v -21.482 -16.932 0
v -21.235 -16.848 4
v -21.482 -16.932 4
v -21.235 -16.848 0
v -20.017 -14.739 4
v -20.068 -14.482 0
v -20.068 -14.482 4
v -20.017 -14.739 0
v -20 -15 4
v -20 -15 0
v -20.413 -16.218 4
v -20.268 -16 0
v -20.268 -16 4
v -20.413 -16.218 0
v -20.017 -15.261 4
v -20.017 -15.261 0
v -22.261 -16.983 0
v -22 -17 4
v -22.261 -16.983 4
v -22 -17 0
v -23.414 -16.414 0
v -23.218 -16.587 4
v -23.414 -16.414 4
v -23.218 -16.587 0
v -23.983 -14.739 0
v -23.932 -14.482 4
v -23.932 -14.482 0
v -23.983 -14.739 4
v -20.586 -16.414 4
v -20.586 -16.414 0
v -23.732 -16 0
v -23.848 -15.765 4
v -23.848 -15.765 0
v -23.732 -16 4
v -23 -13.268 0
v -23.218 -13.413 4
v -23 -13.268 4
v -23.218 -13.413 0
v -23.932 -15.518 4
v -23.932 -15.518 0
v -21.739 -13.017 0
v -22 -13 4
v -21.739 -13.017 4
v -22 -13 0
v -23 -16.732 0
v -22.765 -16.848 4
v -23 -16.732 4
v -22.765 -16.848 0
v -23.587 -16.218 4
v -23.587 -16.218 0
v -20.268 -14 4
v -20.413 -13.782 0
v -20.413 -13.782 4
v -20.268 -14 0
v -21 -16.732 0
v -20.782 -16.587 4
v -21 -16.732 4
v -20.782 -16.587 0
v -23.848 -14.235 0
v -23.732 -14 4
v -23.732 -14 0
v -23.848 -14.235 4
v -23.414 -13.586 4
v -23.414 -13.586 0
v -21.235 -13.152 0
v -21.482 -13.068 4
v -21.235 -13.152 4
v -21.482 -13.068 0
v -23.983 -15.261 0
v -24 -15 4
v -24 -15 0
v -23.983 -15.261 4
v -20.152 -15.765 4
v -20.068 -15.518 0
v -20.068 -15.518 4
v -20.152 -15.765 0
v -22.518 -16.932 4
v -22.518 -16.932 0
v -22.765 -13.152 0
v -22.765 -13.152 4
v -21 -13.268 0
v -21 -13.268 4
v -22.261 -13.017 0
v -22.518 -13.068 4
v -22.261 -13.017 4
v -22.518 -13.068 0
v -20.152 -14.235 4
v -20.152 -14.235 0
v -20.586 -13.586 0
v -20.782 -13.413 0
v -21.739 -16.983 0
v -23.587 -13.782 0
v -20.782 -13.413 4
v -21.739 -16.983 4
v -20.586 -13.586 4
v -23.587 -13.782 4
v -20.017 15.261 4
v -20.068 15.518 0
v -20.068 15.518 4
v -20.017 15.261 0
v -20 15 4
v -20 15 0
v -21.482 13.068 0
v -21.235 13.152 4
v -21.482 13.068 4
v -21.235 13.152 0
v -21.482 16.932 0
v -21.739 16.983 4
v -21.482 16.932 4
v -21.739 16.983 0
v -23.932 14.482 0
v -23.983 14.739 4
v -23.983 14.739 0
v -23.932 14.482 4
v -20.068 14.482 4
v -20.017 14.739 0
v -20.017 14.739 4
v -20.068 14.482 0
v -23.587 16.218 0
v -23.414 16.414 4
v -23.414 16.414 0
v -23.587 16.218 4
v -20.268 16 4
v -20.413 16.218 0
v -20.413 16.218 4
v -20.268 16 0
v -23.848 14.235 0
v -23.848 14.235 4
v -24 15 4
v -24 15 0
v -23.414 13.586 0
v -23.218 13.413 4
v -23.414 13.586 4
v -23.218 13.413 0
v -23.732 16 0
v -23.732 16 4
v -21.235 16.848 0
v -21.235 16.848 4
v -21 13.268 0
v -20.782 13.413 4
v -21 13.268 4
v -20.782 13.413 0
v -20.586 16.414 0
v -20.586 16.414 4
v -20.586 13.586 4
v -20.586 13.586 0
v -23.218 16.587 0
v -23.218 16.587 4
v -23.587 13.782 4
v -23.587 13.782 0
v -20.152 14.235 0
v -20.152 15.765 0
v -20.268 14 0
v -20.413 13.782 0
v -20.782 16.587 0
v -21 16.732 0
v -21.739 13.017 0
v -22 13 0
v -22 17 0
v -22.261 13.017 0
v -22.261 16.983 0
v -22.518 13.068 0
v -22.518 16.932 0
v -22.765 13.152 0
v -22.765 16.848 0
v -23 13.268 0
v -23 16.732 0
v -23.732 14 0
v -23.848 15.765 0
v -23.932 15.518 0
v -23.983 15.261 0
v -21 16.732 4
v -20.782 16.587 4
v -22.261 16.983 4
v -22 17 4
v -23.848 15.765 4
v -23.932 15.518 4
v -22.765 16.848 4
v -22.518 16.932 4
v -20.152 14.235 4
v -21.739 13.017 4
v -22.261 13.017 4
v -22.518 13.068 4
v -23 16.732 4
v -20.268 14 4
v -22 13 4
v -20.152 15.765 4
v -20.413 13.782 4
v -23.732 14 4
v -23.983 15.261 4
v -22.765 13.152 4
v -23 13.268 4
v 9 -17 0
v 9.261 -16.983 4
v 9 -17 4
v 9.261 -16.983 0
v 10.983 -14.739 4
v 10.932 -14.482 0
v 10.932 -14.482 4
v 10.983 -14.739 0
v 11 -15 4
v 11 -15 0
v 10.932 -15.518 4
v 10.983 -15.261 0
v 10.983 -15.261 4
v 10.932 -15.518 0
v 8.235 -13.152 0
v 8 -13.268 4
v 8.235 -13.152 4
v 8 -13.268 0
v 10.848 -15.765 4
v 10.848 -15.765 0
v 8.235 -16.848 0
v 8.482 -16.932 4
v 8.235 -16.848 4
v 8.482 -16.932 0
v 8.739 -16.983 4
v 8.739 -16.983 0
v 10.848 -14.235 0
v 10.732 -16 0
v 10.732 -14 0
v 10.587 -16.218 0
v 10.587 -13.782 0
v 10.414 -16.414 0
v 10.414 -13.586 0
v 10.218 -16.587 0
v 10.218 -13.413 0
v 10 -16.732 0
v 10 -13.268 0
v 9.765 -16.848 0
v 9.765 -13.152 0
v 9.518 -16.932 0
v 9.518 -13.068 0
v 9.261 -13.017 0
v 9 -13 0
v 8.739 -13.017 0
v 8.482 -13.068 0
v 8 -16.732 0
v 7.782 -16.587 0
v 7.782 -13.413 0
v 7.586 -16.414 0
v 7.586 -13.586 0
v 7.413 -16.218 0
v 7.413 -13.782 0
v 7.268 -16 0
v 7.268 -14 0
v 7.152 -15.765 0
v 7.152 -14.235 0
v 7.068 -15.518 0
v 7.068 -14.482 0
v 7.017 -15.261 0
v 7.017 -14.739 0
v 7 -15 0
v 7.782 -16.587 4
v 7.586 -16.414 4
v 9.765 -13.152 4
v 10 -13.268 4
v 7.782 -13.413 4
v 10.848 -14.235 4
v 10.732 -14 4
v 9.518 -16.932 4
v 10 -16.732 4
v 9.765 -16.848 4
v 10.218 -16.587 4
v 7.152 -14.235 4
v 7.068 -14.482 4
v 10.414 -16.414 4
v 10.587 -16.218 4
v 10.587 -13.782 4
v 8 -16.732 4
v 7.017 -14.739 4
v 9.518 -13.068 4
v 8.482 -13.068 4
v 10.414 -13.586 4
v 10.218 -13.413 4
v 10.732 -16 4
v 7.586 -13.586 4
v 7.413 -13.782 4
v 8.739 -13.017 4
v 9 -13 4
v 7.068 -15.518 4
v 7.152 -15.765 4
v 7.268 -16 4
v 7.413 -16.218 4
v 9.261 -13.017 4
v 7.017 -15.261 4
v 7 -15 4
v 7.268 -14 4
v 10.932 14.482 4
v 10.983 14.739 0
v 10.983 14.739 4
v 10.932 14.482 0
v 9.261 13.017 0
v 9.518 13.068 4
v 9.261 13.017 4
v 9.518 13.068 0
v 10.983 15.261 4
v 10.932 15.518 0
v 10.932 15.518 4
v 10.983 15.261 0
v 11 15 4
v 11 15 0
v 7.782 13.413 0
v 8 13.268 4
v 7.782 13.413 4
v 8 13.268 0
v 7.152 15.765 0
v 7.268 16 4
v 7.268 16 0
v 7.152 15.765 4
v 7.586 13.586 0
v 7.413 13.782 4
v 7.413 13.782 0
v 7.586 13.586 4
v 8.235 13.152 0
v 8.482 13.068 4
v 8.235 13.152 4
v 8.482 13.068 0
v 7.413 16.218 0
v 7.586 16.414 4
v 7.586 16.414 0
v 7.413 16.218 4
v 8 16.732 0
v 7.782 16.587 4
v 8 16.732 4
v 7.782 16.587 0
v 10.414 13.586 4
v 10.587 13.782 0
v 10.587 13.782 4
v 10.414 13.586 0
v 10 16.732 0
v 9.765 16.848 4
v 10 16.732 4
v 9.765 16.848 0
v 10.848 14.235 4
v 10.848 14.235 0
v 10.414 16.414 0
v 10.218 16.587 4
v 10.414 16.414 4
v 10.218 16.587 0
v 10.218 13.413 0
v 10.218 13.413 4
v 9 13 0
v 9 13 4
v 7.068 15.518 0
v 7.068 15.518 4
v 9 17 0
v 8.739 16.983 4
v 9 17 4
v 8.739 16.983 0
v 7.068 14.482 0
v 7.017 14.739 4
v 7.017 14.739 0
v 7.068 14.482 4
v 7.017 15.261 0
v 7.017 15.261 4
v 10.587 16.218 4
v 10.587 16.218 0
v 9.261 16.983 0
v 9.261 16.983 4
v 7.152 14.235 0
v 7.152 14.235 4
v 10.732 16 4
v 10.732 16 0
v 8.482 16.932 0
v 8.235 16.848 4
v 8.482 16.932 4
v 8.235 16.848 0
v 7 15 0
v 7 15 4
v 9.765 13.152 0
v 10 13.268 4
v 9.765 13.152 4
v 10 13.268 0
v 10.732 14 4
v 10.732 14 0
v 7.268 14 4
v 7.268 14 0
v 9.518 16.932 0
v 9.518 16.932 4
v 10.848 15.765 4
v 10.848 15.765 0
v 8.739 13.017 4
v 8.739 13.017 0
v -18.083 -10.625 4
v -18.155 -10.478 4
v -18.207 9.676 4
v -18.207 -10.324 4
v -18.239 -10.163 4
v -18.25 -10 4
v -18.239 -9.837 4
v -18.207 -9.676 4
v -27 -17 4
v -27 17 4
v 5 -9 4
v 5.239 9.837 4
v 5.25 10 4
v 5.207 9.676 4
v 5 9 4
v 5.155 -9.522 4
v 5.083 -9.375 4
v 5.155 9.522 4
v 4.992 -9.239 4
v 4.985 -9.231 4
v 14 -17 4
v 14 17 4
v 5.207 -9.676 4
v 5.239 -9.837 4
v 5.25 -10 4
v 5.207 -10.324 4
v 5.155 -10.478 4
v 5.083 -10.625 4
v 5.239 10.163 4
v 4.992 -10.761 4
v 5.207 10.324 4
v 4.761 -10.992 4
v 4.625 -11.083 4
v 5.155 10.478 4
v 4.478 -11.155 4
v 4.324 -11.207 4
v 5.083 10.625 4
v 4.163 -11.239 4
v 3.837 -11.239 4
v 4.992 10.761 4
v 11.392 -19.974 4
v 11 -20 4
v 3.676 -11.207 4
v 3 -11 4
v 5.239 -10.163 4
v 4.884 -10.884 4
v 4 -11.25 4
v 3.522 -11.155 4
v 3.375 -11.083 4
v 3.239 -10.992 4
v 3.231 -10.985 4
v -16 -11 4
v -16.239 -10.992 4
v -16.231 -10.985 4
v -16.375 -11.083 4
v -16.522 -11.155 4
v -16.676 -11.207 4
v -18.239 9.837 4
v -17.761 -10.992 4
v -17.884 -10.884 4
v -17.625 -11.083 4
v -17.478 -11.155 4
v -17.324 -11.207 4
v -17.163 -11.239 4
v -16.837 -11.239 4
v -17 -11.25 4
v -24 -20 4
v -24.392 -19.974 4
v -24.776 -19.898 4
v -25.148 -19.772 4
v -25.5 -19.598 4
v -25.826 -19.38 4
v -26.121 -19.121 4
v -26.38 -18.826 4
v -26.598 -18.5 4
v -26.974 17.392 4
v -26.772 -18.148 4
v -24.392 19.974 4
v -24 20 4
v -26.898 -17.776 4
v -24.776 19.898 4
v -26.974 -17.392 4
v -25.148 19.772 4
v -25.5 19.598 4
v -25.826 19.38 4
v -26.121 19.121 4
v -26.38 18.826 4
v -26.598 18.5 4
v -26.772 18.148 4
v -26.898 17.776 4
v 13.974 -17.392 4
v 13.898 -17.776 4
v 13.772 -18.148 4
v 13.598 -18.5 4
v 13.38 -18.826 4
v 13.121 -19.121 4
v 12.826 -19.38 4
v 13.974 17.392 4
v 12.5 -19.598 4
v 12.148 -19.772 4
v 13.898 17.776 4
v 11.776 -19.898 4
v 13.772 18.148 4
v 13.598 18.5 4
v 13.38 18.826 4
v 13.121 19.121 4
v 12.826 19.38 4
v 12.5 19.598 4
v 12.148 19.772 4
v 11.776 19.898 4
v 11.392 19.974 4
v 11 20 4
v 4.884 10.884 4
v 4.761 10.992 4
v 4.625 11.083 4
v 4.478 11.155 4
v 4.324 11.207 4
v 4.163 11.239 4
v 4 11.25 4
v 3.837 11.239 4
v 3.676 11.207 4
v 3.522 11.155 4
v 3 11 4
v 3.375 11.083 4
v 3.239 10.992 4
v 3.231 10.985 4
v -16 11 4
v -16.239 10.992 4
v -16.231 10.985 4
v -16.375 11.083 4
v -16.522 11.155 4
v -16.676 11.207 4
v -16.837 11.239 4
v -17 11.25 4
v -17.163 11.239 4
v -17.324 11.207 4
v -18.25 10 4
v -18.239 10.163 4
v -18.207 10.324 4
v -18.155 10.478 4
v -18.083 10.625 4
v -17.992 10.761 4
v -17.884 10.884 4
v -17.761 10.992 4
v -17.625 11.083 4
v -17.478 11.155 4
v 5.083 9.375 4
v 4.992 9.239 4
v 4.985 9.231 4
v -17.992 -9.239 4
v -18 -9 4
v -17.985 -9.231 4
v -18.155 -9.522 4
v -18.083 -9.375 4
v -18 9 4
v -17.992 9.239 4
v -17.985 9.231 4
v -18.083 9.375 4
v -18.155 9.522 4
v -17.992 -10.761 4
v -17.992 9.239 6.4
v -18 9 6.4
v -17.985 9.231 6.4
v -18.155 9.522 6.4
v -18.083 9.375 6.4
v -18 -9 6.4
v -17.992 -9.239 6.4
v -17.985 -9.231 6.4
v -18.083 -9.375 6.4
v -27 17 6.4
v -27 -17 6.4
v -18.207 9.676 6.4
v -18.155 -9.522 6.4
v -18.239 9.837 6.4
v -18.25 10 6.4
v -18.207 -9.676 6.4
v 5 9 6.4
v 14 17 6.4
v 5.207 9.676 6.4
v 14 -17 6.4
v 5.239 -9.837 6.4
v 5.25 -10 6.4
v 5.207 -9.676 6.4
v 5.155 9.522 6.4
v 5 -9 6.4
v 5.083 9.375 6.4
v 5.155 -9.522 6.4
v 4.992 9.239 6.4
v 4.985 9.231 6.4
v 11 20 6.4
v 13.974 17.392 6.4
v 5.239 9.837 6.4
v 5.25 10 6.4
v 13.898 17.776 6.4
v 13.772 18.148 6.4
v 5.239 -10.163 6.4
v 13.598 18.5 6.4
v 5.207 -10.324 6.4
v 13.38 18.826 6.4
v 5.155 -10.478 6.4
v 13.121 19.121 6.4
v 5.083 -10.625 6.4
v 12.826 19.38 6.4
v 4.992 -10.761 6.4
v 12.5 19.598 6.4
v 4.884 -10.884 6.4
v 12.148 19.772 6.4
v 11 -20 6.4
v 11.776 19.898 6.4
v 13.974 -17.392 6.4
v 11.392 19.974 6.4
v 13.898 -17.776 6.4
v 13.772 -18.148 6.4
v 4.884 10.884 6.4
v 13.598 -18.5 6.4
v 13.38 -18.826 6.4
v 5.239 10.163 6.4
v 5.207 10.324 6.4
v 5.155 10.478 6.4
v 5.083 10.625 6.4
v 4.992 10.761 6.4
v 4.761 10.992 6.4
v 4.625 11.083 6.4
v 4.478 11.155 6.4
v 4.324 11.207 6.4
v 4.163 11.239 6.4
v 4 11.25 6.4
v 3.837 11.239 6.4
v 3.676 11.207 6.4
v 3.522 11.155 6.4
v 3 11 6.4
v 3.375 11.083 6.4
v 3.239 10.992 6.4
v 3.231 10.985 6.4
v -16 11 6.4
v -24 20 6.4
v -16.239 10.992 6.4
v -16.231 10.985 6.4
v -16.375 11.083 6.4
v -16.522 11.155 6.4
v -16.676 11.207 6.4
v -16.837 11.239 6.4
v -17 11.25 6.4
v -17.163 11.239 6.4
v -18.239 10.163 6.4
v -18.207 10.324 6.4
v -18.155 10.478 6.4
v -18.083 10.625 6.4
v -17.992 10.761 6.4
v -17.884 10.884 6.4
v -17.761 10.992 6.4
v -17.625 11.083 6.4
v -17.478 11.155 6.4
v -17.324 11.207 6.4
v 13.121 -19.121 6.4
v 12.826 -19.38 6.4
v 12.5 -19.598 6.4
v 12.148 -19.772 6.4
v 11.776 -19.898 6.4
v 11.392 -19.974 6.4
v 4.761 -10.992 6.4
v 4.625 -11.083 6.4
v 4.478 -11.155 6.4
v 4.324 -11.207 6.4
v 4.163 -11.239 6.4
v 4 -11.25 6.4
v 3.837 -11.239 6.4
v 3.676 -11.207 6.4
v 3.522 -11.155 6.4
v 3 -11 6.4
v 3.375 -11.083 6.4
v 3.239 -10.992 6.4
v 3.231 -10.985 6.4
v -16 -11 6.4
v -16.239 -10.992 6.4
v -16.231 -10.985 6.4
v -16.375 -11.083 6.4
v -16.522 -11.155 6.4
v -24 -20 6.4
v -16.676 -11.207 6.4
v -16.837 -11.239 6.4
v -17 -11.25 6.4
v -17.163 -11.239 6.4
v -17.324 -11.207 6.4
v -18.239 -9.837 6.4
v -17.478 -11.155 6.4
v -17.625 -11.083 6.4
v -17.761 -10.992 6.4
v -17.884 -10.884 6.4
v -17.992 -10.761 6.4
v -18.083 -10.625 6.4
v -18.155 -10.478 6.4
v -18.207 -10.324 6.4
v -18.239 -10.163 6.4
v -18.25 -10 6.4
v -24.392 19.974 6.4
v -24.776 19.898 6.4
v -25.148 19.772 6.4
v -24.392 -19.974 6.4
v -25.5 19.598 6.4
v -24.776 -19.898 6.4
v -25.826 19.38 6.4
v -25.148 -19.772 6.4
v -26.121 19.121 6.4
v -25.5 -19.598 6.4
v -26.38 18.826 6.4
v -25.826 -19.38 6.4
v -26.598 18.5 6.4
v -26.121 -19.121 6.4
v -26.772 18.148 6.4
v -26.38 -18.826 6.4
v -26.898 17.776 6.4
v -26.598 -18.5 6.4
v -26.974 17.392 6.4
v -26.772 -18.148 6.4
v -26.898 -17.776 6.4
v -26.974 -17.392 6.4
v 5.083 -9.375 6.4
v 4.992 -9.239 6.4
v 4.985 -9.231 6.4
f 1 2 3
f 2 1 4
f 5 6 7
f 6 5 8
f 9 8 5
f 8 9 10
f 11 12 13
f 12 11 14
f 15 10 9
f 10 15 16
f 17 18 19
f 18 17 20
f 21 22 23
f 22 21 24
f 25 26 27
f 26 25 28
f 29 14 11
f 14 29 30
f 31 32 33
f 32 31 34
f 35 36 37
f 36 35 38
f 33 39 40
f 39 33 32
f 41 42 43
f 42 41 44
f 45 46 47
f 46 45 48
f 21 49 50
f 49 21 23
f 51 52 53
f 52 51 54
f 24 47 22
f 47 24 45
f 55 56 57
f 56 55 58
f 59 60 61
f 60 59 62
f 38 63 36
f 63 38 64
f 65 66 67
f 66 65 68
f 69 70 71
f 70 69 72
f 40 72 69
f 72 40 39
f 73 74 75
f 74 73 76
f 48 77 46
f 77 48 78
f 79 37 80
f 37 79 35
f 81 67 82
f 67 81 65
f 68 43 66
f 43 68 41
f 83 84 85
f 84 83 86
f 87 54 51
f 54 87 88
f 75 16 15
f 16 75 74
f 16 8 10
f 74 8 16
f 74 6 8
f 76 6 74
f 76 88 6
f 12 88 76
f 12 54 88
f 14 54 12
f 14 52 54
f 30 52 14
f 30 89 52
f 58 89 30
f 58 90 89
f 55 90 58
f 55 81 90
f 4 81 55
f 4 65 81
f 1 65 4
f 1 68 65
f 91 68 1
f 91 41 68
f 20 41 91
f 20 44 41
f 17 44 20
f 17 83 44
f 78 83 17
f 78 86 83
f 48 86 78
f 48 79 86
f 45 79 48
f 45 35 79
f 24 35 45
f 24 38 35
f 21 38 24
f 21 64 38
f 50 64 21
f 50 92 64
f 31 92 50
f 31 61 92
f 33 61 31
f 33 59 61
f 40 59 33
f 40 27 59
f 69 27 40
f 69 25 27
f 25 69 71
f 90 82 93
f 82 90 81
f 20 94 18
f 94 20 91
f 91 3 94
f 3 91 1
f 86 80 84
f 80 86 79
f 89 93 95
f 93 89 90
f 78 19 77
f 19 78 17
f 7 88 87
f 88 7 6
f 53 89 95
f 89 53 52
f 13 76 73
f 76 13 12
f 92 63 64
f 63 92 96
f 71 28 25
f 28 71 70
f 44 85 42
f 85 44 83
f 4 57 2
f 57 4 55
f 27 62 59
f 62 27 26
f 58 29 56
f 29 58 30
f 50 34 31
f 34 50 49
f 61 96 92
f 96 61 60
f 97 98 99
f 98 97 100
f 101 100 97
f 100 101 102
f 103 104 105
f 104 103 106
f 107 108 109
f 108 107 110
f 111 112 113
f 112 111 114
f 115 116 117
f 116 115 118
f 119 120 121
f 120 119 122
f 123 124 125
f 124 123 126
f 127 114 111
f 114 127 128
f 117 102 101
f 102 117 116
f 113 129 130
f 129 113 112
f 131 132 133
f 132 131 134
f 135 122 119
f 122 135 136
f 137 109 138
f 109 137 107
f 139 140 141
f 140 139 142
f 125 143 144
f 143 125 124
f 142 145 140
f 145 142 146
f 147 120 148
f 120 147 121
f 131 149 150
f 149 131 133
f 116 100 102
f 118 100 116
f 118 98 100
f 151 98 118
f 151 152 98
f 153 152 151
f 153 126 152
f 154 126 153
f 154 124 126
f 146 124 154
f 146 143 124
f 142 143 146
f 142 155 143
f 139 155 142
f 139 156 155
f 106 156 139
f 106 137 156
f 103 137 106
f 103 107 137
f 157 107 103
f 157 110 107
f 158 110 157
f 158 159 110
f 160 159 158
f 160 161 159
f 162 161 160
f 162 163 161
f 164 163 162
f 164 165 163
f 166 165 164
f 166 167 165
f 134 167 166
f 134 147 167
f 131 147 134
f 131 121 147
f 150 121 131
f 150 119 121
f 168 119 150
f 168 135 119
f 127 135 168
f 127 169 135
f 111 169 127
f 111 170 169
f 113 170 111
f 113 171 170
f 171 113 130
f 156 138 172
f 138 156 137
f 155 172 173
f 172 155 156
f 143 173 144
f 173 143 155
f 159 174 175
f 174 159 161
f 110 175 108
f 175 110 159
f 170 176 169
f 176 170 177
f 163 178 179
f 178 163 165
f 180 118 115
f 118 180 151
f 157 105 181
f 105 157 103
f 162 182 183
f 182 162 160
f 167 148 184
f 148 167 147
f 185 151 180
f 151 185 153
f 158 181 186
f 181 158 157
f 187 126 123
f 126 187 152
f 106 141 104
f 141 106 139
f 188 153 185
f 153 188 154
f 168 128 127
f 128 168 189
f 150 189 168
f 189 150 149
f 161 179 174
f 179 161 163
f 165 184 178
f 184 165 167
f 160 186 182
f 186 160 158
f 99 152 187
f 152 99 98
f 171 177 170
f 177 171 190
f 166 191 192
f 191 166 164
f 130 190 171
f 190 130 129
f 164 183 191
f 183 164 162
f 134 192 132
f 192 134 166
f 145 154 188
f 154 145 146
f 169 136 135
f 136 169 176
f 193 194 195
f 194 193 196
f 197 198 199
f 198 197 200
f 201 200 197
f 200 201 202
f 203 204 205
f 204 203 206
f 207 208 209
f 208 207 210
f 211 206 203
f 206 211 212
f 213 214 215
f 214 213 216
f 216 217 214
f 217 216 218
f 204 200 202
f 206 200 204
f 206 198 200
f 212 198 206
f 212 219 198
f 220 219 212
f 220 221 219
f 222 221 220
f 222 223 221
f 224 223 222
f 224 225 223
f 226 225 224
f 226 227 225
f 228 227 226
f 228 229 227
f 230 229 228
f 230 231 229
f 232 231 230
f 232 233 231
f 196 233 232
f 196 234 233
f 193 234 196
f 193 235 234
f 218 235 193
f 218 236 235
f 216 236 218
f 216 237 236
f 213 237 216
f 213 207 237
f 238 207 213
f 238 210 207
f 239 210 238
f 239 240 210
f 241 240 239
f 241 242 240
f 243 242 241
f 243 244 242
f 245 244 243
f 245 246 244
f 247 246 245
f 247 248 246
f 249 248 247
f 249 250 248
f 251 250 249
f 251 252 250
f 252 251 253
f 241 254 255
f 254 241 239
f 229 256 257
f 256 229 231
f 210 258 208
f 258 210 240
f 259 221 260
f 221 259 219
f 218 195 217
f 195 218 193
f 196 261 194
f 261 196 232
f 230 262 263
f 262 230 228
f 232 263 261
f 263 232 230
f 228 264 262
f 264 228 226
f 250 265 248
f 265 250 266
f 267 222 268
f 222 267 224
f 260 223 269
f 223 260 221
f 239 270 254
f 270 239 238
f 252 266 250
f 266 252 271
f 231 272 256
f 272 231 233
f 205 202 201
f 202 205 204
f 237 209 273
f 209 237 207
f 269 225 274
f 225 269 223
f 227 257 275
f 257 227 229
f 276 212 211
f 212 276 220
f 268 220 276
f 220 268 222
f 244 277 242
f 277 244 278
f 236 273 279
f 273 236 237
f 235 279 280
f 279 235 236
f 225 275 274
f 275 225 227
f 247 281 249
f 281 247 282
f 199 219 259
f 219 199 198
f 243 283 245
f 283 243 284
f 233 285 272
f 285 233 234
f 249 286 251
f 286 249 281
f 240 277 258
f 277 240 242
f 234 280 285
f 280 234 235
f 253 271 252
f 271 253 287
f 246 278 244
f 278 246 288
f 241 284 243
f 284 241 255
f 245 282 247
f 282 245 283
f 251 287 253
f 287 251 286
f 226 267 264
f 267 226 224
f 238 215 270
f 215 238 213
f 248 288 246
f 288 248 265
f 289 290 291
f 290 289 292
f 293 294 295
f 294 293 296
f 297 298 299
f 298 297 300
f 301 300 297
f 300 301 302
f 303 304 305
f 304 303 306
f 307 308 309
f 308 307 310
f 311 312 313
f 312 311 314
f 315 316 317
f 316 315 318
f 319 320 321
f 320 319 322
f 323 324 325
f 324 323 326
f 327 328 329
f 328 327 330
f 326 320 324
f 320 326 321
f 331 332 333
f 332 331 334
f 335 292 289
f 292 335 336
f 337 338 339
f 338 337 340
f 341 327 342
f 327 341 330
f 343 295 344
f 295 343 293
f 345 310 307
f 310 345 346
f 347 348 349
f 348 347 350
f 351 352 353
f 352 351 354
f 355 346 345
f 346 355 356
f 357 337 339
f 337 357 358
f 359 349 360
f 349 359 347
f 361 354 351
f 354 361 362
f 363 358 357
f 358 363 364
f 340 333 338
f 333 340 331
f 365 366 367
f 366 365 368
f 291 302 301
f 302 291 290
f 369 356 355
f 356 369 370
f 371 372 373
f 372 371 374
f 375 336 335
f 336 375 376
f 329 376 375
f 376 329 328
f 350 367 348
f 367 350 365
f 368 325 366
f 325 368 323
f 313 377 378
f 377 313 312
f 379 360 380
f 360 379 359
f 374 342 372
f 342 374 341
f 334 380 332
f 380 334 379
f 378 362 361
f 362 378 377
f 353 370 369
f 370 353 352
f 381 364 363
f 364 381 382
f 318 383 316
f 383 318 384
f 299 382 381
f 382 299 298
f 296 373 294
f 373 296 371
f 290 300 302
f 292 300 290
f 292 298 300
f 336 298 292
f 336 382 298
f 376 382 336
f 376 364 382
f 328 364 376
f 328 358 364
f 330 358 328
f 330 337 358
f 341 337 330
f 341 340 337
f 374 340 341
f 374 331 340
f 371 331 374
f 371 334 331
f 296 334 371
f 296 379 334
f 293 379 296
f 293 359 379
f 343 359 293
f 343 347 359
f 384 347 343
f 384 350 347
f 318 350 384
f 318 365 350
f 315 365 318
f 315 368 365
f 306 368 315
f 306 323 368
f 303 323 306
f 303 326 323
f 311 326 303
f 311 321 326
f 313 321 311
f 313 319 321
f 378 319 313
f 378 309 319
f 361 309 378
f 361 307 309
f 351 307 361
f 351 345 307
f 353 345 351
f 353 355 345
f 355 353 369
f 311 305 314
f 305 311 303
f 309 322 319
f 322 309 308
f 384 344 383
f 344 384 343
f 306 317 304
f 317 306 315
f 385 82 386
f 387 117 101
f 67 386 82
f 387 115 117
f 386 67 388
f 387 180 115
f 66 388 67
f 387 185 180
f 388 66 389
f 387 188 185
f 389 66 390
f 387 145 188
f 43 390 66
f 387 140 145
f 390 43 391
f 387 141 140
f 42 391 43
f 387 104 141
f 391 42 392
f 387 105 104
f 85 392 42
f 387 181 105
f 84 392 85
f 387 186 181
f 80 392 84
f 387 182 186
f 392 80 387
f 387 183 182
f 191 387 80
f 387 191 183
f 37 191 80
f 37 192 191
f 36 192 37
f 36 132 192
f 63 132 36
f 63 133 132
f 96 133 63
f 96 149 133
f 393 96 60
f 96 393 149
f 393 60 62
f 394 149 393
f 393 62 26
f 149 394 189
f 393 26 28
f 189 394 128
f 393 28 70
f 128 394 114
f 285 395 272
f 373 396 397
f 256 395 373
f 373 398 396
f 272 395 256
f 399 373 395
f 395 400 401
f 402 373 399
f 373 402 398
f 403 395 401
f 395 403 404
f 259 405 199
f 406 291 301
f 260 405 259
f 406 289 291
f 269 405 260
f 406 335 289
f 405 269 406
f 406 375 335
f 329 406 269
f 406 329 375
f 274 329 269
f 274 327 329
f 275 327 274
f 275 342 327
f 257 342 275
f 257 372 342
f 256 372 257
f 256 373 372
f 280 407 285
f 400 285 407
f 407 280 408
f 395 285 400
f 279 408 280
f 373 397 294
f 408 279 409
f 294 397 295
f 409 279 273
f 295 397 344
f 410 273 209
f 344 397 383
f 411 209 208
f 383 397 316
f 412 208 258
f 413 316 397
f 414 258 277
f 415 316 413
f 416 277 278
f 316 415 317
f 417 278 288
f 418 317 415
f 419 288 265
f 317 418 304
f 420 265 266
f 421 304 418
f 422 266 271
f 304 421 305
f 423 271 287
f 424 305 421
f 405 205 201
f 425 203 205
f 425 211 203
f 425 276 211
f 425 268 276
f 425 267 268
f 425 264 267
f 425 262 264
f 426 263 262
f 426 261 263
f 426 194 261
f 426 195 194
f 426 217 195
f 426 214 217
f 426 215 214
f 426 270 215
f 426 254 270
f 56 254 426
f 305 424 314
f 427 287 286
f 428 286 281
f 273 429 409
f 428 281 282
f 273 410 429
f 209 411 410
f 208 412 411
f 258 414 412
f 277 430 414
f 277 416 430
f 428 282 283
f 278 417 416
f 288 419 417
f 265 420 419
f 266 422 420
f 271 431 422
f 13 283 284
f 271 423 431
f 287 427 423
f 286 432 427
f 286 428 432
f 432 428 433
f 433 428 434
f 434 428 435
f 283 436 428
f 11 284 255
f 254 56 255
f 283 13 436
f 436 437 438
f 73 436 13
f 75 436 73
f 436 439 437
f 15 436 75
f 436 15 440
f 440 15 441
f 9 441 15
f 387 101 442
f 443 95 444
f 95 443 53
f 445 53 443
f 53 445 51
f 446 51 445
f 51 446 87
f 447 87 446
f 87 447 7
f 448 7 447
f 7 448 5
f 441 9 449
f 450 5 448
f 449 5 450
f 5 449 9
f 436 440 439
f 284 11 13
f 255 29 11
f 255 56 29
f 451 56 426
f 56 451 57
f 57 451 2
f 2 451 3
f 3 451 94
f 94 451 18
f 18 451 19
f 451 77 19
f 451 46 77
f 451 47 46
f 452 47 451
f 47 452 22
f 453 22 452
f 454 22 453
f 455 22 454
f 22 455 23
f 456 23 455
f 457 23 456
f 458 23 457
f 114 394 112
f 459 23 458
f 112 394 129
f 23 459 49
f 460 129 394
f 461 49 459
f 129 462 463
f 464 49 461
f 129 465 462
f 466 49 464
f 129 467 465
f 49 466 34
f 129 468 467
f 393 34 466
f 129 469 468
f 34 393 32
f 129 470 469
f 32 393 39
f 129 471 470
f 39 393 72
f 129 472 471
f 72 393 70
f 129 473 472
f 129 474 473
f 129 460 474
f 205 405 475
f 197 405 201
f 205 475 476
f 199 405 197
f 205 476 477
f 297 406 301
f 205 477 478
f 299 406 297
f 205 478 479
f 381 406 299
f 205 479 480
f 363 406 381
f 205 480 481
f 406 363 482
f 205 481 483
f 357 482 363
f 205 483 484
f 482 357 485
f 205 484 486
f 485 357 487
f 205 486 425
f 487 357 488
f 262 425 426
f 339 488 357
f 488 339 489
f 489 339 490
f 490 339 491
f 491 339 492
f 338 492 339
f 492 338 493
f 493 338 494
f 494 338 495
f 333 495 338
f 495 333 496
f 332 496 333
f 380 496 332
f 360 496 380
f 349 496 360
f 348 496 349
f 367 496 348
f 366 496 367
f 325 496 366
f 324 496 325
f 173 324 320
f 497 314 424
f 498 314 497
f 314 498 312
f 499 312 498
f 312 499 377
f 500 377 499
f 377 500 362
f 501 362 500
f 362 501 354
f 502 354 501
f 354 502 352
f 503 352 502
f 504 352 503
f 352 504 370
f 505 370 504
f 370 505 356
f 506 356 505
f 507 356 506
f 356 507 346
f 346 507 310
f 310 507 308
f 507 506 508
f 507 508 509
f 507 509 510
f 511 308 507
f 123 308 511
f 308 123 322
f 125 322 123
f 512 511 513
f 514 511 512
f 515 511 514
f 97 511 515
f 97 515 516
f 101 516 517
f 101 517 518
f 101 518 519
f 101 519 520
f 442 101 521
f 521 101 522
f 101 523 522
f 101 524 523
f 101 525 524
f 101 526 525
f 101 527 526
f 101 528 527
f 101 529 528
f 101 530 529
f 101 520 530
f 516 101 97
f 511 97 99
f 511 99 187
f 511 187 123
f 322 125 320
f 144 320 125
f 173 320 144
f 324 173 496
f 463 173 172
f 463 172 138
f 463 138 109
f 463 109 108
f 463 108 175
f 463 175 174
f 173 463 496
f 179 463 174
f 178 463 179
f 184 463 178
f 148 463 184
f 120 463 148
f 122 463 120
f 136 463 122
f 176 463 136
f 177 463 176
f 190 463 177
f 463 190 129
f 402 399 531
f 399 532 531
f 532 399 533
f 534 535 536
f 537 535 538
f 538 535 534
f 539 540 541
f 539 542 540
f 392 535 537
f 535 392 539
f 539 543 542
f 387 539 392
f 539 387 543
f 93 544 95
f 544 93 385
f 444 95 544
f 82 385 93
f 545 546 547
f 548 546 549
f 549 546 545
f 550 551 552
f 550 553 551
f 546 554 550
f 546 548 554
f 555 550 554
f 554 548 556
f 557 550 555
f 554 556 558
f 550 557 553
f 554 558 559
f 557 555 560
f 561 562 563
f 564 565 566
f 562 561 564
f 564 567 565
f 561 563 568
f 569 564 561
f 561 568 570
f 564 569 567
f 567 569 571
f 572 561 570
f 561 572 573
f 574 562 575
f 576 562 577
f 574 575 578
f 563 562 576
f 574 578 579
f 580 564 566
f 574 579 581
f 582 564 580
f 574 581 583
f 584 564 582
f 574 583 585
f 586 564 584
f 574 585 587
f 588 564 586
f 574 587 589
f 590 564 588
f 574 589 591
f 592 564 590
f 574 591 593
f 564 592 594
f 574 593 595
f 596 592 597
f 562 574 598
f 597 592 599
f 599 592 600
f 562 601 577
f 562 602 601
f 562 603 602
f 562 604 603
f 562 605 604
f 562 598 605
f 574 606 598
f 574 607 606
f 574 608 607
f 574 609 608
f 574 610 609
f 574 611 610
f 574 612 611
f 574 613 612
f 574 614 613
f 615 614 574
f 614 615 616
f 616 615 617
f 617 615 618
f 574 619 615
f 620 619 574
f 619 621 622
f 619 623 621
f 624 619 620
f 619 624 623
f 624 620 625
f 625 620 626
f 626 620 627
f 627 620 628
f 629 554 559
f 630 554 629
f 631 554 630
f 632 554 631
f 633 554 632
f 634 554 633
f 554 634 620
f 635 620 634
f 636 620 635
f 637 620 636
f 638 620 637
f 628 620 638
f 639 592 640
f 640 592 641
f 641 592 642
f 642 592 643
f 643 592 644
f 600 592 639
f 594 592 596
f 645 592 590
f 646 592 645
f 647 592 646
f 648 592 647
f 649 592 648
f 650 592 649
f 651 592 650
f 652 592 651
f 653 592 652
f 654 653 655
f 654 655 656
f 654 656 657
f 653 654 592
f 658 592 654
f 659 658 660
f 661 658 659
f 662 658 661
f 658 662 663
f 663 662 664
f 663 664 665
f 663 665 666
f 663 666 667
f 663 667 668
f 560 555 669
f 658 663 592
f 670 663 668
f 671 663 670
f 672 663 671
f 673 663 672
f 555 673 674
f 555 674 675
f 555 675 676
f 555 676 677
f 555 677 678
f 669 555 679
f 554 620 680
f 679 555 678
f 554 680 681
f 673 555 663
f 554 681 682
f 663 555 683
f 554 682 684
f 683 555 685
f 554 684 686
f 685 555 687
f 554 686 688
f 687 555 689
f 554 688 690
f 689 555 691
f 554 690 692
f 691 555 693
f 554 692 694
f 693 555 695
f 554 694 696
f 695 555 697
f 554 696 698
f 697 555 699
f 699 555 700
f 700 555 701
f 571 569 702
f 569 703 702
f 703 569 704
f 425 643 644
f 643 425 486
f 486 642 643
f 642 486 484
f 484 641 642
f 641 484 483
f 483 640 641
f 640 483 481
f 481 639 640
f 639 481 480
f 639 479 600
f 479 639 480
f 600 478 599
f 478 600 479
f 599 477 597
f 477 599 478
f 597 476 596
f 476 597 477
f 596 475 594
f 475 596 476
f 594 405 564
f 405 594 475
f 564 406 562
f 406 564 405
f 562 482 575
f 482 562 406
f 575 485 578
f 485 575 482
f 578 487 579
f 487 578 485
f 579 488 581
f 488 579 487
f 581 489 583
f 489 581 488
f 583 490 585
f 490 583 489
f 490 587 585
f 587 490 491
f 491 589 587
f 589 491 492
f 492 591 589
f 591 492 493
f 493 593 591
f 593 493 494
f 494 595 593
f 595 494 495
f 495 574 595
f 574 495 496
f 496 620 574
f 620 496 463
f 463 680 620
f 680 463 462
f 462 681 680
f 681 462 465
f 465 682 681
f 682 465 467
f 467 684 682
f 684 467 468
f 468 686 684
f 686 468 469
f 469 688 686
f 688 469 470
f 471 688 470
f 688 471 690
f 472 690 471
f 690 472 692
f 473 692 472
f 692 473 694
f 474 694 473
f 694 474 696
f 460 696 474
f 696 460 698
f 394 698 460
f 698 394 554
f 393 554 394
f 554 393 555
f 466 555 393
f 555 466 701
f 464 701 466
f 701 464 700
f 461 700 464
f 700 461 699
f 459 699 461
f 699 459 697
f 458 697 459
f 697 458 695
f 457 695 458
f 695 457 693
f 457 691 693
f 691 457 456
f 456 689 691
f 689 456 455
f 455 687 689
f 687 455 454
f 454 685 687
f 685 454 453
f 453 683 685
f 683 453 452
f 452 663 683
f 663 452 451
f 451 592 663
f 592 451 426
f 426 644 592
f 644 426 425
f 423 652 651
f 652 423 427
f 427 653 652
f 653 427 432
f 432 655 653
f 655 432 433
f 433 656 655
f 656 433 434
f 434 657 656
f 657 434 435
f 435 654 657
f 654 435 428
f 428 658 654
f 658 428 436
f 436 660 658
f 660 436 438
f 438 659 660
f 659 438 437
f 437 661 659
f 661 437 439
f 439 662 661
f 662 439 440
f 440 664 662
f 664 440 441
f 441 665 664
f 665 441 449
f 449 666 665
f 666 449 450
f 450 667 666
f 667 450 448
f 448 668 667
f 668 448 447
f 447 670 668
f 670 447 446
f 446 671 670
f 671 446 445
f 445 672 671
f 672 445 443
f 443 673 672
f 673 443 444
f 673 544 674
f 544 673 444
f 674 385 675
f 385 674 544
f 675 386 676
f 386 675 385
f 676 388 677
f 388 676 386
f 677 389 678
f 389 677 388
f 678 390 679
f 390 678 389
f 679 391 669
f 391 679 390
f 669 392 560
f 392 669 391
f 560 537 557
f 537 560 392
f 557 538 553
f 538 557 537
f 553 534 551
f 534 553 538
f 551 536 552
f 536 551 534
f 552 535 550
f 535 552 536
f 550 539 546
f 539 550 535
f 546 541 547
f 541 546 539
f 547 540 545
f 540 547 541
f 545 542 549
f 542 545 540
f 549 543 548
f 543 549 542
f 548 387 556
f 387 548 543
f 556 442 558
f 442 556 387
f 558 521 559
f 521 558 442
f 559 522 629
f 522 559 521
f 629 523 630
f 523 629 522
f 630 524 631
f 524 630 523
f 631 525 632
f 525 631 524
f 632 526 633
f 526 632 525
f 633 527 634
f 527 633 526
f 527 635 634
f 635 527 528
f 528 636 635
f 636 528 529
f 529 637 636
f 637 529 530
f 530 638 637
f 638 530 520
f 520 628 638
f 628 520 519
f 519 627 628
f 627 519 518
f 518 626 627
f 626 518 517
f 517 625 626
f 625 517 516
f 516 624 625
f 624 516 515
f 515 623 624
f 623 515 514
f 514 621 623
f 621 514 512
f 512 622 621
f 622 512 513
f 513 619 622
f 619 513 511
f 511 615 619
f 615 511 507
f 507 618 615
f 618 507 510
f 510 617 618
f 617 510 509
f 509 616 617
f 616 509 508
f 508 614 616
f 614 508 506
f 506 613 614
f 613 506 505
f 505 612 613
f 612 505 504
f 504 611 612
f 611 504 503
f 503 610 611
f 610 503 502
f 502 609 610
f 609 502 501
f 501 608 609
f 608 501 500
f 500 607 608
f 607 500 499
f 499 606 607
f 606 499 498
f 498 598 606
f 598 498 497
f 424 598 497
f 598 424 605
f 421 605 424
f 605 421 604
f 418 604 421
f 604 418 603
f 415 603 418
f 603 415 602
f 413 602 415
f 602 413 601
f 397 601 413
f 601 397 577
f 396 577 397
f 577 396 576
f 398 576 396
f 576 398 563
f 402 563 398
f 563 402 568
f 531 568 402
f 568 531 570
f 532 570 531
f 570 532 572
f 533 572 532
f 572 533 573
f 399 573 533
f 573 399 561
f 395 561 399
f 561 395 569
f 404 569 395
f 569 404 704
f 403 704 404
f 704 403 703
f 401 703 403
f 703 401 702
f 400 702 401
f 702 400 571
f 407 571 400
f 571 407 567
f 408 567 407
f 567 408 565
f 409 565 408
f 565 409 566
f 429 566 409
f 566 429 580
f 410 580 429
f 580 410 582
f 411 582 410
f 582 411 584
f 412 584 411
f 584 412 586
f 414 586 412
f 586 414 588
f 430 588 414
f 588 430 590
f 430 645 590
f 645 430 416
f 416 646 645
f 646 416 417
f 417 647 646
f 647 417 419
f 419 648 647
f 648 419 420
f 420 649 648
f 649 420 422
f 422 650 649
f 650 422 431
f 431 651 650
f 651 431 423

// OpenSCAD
// =============================================================================
// camera_holder.scad - Jepit modul kamera night-vision (OV5647 + 2x IR LED)
// =============================================================================
//  PERUBAHAN PERAN: dulu part ini adalah dudukan kamera yang TERANG di ujung
//  lengan. Sekarang kamera sudah DI DALAM enclosure.scad, jadi part ini
//  hanya menjepit PCB kamera dari belakang ke boss di dinding muka depan.
//
//  TUMPUKAN Z (lokal; z = 0 = muka DALAM dinding muka depan enclosure)
//    0    ....  panjang_pilar_jepit ....  boss self-tap M2 di enclosure
//    3,0  ....  4,0  .....................  PCB modul kamera night-vision (1 mm)
//    4,0  ....  6,4  .....................  PELAT JEPIIT (part ini, 2,4 mm)
//
//  Pemasangan: 4x sekrup M2 x 12 dari pelat jepit, menembus PCB kamera lalu
//  masuk ke boss self-tap di dinding muka depan enclosure.
//
//  Modul bisa dilepas (buka 4 sekrup M2) tanpa membongkar lengan.
//
//  URUTAN PEMASANGAN YANG BENAR:
//    1. masukkan modul kamera, Optic menghadap -Z (ke arah bed)
//    2. sambungkan ribbon CSI ke konektor di belakang modul
//    3. kencangkan 4 sekrup M2 secara SILANG, bukan berurutan, supaya PCB
//       rata dan tidak mendeformasi sudut PCB
//    4. pasang kunci barrel (kalau dipakai) lalu fokuskan
// =============================================================================

include <params.scad>

tampilkan_standalone = is_undef(tampilkan_standalone_ov) ? true : tampilkan_standalone_ov;

// --- Geometri turunan ---
z_pcb_depan    = panjang_pilar_jepit;                 // muka depan PCB
z_pcb_belakang = z_pcb_depan + kamera_pcb_t;           // muka belakang PCB
lebar_pelat    = kamera_pcb_w + 10;
tinggi_pelat   = kamera_pcb_h + 10;
pos_x          = pola_lubang_x / 2 + 5;                // posisi post penahan
pos_y          = pola_lubang_y / 2 + 5;

// =============================================================================
//  PELAT JEPIIT - menekan PCB kamera dari belakang
//  Berada di z = z_pcb_belakang .. + dinding_jepit, yaitu DI BELAKANG PCB.
//
//  POSISI: seluruh part ini digeser ke bukaan_kamera_dx, supaya modul kamera
//  berada tepat di belakang barrel optik yang menembus dinding muka depan.
//  Boss di enclosure.scad memakai angka yang sama, jadi keduanya selalu senada.
//  Kalau bukaan digeser, jepit ini ikut bergeser otomatis.
// =============================================================================
module pelat_jepit() {
    translate([bukaan_kamera_dx, 0, z_pcb_belakang])
        linear_extrude(height = dinding_jepit)
            difference() {
                offset(r = 3)
                    square([lebar_pelat, tinggi_pelat], center = true);

                // 4 lubang sekrup M2 yang menembus PCB ke boss enclosure
                for (sx = [-1, 1], sy = [-1, 1])
                    translate([sx * pola_lubang_x / 2, sy * pola_lubang_y / 2])
                        circle(d = diameter_sekrup_m2 + 0.5);

                // Jendela tengah: memberi jalan ke konektor ribbon CSI di
                // belakang PCB, mengurangi bahan cetak, serta membantu aliran udara
                offset(r = 2)
                    square([kamera_pcb_w - 6, kamera_pcb_h - 6], center = true);
            }
}

// 4 post penahan: duduk di dinding muka depan enclosure, DI LUAR PCB.
// Tingginya dibuat sampai masuk separuh ke pelat jepit, supaya keduanya
// menjadi SATU komponen padat (bukan dua benda yang hanya bersentuhan).
module post_penahan() {
    h = z_pcb_belakang + dinding_jepit / 2;
    for (sx = [-1, 1], sy = [-1, 1])
        translate([bukaan_kamera_dx + sx * pos_x, sy * pos_y, 0])
            cylinder(d = 4.0, h = h);
}

// =============================================================================
//  KUNCI BARREL - SUDAH DIHAPUS, dan ini alasannya.
// =============================================================================
//  Versi pertama memakai cincin setengah atas dengan 2 post ke pelat jepit.
//  Post-nya diletakkan pada x = +/- rt (telinga cincin), dan hal itu
//  jatuh tepat di DALAM jendela tengah pelat, sehingga
//  post tidak pernah menyentuh pelat. Hasil ekspor STL terverifikasi menjadi
//  3 komponen terpisah, bukan satu benda utuh.
//
//  Menggantinya dengan geometri yang lebih rapi justru berisiko: tidak ada
//  yang bisa menguji gesekan barrel tanpa modul fisik di tangan, dan salah
//  desain akan membuat cetakan pertama gagal.
//
//  CARA MENAHAN FOKUS YANG DIPAKAI SEKARANG
//    1. Fokuskan SETELAH modul terpasang menjepit (barrel berupa gesekan
//       pas di lubang optik dinding muka depan enclosure).
//    2. Tandai posisi barrel dengan spidol pada ring knurled.
//    3. Cek ulang fokus setiap kali box dibuka atau setelah dipindah.
//    4. Opsional: sekencang O-ring karet / lakban pada barrel, atau lem
//       polypropylene cyanoacrylate dosis kecil. Ini jauh lebih andal
//       daripada dongolan plastik.
// =============================================================================

// =============================================================================
//  RAKITAN
// =============================================================================
module camera_holder_isi() {
    color("SteelBlue") post_penahan();
    color("SteelBlue") pelat_jepit();
}

if (tampilkan_standalone) {
    camera_holder_isi();
}
